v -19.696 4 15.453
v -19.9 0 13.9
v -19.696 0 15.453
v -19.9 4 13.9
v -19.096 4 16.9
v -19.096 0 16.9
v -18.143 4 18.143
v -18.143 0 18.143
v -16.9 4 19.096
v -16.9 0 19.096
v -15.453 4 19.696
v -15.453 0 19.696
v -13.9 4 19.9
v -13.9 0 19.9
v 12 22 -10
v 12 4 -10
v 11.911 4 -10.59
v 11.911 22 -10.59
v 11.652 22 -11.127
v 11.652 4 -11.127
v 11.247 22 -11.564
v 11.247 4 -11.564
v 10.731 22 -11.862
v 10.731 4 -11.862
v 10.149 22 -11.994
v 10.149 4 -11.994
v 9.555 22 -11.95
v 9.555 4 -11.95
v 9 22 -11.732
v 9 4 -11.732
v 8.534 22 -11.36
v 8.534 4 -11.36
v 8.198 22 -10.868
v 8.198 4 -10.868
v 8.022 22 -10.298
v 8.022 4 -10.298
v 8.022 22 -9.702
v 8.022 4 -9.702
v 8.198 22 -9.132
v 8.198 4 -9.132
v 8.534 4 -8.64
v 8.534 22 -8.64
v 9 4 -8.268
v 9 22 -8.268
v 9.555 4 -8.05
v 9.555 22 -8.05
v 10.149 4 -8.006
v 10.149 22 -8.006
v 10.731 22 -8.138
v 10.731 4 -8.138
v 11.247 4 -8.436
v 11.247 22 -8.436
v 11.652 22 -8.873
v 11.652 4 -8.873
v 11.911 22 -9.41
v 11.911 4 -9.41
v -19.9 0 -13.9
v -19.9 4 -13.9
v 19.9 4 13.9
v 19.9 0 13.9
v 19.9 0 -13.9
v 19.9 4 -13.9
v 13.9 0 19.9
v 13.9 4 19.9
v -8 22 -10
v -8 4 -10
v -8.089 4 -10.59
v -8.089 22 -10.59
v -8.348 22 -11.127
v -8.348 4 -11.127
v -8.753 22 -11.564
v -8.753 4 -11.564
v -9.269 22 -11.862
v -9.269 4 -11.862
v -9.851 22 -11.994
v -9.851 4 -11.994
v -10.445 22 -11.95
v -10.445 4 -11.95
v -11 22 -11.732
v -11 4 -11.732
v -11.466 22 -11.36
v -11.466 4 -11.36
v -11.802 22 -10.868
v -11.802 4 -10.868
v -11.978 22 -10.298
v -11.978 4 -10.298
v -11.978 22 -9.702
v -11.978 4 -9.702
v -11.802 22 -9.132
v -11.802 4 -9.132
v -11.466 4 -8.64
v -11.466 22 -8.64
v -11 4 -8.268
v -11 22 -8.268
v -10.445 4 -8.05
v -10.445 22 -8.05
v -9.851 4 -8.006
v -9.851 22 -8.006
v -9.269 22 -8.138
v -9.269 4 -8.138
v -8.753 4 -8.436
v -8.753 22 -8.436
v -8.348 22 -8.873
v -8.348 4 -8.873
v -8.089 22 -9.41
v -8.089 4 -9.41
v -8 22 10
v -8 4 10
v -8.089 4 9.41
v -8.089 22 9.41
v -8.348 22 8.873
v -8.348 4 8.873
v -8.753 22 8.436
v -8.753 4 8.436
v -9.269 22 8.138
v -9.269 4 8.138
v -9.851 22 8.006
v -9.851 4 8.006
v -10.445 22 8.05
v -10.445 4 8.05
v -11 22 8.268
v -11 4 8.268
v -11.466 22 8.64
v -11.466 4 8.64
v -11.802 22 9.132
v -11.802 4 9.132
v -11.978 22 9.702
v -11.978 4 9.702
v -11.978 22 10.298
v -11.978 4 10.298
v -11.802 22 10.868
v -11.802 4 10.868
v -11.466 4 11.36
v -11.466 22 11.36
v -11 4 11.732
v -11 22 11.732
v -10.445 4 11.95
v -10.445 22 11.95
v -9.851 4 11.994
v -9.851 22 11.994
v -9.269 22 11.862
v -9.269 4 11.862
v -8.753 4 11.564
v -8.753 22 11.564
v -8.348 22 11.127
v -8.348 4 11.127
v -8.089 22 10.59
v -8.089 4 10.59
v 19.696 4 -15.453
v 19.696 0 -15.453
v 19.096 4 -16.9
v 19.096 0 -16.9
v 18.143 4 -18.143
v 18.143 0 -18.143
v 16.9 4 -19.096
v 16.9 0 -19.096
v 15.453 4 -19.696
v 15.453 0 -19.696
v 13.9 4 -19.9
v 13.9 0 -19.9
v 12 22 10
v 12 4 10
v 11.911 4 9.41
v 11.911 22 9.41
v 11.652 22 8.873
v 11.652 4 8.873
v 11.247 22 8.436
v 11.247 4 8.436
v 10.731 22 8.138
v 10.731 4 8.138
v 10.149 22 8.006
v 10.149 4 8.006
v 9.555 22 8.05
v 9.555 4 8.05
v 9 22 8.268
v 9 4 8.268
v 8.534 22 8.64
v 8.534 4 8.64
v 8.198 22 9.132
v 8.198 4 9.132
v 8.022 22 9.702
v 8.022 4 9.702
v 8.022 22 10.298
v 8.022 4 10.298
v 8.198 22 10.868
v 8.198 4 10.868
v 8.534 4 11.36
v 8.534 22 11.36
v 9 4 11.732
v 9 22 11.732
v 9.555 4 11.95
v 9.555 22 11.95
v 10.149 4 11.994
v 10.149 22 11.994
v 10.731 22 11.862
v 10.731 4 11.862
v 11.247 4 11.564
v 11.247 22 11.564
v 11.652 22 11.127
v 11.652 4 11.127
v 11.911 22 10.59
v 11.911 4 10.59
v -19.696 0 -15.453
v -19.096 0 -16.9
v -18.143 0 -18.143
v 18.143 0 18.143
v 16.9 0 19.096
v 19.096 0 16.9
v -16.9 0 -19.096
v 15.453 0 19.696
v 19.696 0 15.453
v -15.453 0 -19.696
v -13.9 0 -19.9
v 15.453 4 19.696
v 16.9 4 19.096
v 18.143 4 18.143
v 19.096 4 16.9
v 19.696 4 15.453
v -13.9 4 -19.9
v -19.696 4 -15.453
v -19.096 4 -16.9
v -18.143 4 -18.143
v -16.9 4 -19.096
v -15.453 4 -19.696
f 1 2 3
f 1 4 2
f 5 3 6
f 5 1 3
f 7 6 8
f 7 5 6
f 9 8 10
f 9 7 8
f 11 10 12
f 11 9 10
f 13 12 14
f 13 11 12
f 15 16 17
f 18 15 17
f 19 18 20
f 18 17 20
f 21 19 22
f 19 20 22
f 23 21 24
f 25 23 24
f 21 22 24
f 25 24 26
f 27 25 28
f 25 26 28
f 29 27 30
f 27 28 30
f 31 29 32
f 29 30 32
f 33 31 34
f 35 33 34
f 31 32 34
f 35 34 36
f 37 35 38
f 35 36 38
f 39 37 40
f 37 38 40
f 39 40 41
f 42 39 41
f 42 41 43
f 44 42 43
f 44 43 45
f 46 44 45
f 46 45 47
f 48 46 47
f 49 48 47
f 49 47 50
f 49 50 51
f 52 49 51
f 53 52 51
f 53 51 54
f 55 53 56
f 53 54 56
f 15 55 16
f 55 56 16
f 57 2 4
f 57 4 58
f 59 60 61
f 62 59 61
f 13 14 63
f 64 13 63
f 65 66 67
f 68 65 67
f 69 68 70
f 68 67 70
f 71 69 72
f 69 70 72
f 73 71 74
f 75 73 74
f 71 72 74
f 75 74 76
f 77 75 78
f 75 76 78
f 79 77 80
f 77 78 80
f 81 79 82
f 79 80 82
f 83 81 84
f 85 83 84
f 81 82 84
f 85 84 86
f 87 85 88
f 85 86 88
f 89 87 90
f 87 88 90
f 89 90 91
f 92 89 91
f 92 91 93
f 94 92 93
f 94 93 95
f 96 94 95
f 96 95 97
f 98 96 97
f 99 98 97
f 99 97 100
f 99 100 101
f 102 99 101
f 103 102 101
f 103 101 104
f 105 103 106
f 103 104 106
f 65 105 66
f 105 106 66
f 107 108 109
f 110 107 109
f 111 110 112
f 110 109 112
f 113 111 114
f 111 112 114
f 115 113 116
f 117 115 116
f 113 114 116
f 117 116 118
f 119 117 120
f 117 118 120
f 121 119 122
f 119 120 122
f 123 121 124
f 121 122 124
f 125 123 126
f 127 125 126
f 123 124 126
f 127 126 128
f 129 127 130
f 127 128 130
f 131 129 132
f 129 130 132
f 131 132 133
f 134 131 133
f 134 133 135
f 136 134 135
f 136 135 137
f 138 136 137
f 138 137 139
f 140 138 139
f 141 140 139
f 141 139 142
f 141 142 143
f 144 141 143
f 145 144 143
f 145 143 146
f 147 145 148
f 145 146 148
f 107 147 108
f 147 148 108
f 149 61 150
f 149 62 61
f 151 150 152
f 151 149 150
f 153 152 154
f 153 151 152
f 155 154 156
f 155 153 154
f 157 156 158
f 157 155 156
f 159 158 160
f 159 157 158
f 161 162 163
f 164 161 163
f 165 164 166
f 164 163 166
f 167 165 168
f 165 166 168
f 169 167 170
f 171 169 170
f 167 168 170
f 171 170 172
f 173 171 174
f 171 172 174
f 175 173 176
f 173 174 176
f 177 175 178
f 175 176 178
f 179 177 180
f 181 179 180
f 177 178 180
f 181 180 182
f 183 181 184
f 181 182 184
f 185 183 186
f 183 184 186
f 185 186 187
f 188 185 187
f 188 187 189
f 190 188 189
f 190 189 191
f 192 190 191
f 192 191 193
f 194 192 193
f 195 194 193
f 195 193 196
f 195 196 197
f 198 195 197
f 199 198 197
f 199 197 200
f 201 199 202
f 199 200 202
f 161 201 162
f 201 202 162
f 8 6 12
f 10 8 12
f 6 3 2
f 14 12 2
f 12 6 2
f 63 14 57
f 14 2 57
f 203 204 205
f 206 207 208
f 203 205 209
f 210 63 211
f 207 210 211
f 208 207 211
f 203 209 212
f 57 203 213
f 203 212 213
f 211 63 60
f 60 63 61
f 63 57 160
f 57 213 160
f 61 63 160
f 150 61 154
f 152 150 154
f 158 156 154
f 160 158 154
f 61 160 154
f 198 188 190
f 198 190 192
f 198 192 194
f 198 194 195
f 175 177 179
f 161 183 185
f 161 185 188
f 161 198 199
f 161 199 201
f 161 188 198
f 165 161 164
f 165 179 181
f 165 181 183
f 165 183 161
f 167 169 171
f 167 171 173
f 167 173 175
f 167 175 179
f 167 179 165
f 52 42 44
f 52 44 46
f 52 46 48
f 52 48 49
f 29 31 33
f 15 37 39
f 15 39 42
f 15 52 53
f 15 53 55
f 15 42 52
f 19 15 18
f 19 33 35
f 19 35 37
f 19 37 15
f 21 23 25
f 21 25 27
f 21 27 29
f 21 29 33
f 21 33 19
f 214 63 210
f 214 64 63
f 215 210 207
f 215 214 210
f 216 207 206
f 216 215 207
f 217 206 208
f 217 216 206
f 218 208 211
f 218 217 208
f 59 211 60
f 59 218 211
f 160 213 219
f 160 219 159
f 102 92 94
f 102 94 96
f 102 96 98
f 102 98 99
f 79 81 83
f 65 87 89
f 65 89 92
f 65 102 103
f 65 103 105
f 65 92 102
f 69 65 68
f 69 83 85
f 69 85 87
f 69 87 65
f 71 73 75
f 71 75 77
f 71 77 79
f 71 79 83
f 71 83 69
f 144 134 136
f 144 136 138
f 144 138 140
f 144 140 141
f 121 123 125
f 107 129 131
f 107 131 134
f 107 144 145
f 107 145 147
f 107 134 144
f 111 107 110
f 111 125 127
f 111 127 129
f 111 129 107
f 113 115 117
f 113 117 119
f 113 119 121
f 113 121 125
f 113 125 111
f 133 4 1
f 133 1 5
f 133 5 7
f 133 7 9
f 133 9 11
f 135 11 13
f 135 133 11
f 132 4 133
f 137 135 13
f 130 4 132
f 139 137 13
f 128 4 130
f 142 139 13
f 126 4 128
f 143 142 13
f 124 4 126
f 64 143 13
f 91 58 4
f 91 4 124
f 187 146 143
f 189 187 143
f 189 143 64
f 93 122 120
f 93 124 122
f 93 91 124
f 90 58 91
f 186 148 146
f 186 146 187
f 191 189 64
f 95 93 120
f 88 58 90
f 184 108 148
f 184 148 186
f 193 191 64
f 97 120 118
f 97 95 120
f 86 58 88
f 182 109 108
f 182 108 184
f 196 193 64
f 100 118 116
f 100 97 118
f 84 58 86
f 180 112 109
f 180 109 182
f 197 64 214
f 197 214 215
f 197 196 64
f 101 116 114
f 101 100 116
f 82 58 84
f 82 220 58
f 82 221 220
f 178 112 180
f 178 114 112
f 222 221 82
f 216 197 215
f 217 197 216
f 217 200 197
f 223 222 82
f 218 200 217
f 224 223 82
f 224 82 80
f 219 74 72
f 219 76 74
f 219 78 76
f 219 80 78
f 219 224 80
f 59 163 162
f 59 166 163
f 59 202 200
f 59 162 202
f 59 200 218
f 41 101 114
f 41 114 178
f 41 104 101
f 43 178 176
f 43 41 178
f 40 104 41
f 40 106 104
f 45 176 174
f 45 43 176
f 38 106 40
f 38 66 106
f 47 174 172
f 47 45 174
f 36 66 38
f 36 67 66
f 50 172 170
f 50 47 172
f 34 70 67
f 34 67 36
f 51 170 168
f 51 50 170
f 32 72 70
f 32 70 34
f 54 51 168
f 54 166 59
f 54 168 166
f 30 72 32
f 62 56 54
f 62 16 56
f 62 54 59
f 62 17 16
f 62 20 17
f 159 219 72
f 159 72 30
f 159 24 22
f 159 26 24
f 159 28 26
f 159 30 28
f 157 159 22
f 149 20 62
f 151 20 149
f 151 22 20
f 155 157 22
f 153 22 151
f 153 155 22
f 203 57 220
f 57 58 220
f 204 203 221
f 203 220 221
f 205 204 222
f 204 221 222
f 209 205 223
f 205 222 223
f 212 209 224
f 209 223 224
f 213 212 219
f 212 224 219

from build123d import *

# Parameters (mm, degrees)
SKETCH1_W           = 39.8
SKETCH1_H           = 39.8
BOSS_EXTRUDE1_DEPTH = 4
FILLET1_R           = 6
SKETCH2_R           = 2
BOSS_EXTRUDE2_DEPTH = 18


with BuildPart() as part:
    # Sketch1 → Boss-Extrude1 (new body)
    with BuildSketch(Plane(origin=(0, 0, 0), x_dir=(1, 0, 0), z_dir=(0, 1, 0))):
        Rectangle(SKETCH1_W, SKETCH1_H)
    extrude(amount=BOSS_EXTRUDE1_DEPTH)

    # Fillet1
    fillet1_edges = [part.edges().sort_by_distance(p)[0] for p in [
        (19.9, 2, 19.9),
        (-19.9, 2, 19.9),
        (-19.9, 2, -19.9),
        (19.9, 2, -19.9),
    ]]
    fillet(fillet1_edges, radius=FILLET1_R)

    # Sketch2 → Boss-Extrude2 (add)
    with BuildSketch(Plane(origin=(0, 4, 0), x_dir=(1, 0, 0), z_dir=(0, 1, 0))):
        with Locations((-10, 10)):
            Circle(SKETCH2_R)
        with Locations((10, 10)):
            Circle(SKETCH2_R)
        with Locations((10, -10)):
            Circle(SKETCH2_R)
        with Locations((-10, -10)):
            Circle(SKETCH2_R)
    extrude(amount=BOSS_EXTRUDE2_DEPTH)


solid = part.part
